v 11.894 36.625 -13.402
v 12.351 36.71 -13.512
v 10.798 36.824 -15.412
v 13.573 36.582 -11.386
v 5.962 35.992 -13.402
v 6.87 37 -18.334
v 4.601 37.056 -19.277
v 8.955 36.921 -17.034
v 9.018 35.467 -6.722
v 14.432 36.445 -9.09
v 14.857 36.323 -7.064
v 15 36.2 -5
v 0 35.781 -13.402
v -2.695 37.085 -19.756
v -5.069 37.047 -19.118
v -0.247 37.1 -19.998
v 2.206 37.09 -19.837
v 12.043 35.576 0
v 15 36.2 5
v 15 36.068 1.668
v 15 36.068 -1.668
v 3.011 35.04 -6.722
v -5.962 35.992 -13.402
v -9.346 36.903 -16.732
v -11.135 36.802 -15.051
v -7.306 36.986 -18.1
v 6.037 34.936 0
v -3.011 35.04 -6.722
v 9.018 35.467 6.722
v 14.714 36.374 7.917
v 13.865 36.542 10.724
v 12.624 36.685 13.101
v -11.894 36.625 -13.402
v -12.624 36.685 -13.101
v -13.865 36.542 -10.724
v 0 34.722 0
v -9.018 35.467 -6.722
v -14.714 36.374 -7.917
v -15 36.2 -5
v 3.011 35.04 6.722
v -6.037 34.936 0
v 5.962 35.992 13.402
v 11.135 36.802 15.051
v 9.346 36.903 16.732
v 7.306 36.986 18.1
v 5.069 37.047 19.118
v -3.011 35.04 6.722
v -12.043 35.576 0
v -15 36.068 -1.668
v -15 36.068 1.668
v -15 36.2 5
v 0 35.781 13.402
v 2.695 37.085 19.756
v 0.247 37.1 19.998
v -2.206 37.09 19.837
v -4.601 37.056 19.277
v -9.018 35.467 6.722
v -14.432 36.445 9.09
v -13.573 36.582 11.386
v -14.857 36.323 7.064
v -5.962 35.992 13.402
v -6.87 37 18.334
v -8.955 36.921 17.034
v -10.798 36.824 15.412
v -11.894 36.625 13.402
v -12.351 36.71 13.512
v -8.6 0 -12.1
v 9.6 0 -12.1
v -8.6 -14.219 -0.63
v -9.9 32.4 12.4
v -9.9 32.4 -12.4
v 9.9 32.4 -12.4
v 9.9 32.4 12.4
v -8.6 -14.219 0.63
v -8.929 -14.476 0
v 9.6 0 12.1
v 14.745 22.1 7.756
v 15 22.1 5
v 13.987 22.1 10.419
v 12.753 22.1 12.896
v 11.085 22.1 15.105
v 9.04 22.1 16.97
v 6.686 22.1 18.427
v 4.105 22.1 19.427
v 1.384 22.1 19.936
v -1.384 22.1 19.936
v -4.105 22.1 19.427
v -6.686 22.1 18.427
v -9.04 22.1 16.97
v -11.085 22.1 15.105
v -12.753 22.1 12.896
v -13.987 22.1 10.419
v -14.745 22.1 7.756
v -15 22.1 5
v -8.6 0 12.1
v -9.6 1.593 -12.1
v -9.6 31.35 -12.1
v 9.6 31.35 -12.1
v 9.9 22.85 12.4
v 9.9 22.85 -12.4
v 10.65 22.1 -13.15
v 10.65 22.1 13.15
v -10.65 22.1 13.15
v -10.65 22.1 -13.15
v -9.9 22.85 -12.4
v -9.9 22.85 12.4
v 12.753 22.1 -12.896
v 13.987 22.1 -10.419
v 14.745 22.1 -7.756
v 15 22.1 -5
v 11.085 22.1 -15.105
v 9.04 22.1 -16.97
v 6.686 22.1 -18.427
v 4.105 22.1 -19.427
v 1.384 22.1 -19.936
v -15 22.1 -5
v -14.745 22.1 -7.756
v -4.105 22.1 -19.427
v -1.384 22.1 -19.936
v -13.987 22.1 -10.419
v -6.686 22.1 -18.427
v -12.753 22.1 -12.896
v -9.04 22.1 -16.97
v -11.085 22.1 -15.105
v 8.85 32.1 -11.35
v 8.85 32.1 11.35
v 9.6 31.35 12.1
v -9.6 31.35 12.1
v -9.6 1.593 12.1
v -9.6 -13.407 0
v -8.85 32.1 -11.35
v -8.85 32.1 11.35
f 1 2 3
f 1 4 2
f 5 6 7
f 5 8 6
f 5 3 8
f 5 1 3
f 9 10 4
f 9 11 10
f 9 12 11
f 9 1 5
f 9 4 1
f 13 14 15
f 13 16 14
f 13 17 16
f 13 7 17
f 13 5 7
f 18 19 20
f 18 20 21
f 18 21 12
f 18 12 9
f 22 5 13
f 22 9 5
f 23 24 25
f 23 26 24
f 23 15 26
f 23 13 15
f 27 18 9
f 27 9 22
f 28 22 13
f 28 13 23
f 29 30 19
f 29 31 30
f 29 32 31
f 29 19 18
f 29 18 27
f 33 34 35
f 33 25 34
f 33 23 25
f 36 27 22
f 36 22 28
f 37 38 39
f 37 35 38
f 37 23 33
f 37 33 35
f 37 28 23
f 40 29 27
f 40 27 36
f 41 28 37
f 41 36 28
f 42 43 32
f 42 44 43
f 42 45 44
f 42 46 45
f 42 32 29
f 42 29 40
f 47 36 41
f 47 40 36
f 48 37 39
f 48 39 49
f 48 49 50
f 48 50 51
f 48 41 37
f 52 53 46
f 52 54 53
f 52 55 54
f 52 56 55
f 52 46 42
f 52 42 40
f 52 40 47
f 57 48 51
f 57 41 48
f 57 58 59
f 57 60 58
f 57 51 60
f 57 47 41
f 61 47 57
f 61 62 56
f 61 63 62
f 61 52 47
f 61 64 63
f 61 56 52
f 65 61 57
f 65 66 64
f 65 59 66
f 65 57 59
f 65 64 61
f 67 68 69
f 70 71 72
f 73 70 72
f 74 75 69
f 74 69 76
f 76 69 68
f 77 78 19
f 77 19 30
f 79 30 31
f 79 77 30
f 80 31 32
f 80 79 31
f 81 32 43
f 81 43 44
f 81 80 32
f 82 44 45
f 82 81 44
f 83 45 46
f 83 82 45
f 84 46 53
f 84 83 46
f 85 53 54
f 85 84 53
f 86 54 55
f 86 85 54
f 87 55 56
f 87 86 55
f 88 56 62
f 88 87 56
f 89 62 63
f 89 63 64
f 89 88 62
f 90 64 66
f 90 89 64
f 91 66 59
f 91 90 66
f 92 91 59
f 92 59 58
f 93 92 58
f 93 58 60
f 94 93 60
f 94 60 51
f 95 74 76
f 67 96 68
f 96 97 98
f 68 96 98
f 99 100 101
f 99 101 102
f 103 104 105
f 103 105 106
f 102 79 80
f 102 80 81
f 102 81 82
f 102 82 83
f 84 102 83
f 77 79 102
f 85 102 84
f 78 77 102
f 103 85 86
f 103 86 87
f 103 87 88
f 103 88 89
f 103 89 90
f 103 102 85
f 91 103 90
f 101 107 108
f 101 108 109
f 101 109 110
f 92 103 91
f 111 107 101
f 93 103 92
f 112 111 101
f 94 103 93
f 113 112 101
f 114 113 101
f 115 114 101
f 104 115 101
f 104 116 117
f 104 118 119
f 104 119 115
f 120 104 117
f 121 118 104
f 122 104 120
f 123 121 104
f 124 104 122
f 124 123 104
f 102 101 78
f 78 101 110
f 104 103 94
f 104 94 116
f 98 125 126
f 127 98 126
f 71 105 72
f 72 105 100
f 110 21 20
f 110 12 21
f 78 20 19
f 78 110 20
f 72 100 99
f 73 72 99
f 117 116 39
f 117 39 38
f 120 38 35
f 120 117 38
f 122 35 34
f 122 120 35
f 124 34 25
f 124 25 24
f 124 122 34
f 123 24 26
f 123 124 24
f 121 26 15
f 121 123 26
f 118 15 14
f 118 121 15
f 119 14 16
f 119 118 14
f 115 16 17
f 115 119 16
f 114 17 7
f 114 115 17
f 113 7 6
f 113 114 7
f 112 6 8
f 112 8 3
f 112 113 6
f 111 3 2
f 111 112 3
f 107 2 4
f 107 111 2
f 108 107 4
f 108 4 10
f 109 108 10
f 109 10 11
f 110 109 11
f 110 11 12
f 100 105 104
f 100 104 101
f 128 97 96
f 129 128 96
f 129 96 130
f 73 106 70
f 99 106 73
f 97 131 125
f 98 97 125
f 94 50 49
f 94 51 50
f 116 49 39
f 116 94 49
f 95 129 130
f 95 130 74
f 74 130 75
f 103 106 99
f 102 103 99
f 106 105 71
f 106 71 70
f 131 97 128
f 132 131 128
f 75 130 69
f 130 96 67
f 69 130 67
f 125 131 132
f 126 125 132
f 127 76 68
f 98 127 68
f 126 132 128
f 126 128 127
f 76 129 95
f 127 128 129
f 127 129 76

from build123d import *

# Parameters (mm, degrees)
SKETCH1_W               = 19.2
SKETCH1_H               = 24.2
BOSS_EXTRUDE1_DEPTH     = 22.1
BOSS_EXTRUDE2_DEPTH     = 15
BOSS_EXTRUDE3_DEPTH     = 5
BOSS_EXTRUDE4_DEPTH     = 1.5
FILLET1_R               = 3
SKETCH9_W               = 19.8
SKETCH9_H               = 24.8
SKETCH9_W_2             = 19.2
SKETCH9_H_2             = 24.2
CUT_EXTRUDE_THIN1_DEPTH = 10
SKETCH10_W              = 24.8
SKETCH10_H              = 0.3
CUT_EXTRUDE1_DEPTH      = 19.2
SKETCH12_W              = 19.8
SKETCH12_H              = 24.8
CUT_EXTRUDE3_DEPTH      = 0.3
SKETCH13_W              = 24.2
SKETCH13_H              = 15
CUT_EXTRUDE4_DEPTH      = 49.801332116
CHAMFER1_SIZE           = 0.75
CHAMFER2_SIZE           = 0.75
BOSS_EXTRUDE5_DEPTH     = 24.2
CUT_EXTRUDE5_DEPTH      = 19.2
CHAMFER3_SIZE           = 1


with BuildPart() as part:
    # Sketch1 → Boss-Extrude1 (new body)
    with BuildSketch(Plane(origin=(0, 0, 0), x_dir=(1, 0, 0), z_dir=(0, 1, 0))):
        Rectangle(SKETCH1_W, SKETCH1_H)
    extrude(amount=BOSS_EXTRUDE1_DEPTH)

    # Sketch2 → Boss-Extrude2 (add)
    with BuildSketch(Plane(origin=(0, 22.1, 0), x_dir=(1, 0, 0), z_dir=(0, 1, 0))):
        with BuildLine():
            Line((15, 5), (15, -5))
            ThreePointArc((15, -5), (0, -20), (-15, -5))
            Line((-15, -5), (-15, 5))
            ThreePointArc((-15, 5), (0, 20), (15, 5))
        make_face()
    extrude(amount=BOSS_EXTRUDE2_DEPTH)

    # Sketch4 → Boss-Extrude3 (add)
    with BuildSketch(Plane.ZY.offset(9.6)):
        Polygon((-12.1, 0), (0, -15), (12.1, 0), align=None)
    extrude(amount=-BOSS_EXTRUDE3_DEPTH)

    # Sketch6 → Boss-Extrude4 (add, symmetric)
    with BuildSketch(Plane.XY):
        Polygon((-4.6, -5), (9.6, 0), (-4.6, 0), align=None)
    extrude(amount=BOSS_EXTRUDE4_DEPTH, both=True)

    # Fillet1
    fillet1_edges = [part.edges().sort_by_distance(p)[0] for p in [
        (-4.6, 0, 6.8),
        (-4.6, 0, -6.8),
    ]]
    fillet(fillet1_edges, radius=FILLET1_R)

    # Sketch8 → Cut-Revolve3 (revolve, cut)
    with BuildSketch(Plane(origin=(0, 0, 0), x_dir=(0, 0, -1), z_dir=(1, 0, 0))):
        with BuildLine():
            Line((-85.278426346, 120), (85.278426346, 120))
            ThreePointArc((85.278426346, 120), (0, 34.721573654), (-85.278426346, 120))
        make_face()
    revolve(axis=Axis((0, 120, 85.278426346), (0, 0, -1)), mode=Mode.SUBTRACT)

    # Sketch9 → Cut-Extrude-Thin1 (cut)
    with BuildSketch(Plane.XZ.offset(-22.1)):
        Rectangle(SKETCH9_W, SKETCH9_H)
        Rectangle(SKETCH9_W_2, SKETCH9_H_2, mode=Mode.SUBTRACT)
    extrude(amount=-CUT_EXTRUDE_THIN1_DEPTH, mode=Mode.SUBTRACT)

    # Sketch10 → Cut-Extrude1 (cut)
    with BuildSketch(Plane.ZY.offset(9.6)):
        with Locations((0, 32.25)):
            Rectangle(SKETCH10_W, SKETCH10_H)
    extrude(amount=-CUT_EXTRUDE1_DEPTH, mode=Mode.SUBTRACT)


with BuildPart() as cut_extrude1_piece_1:
    # of the separate pieces the step leaves, piece 1, a body of its own (cut_extrude1_pieces)
    add(part.part.solids().sort_by_distance((-1.6, 0, -12.1))[0])

    # Sketch13 → Cut-Extrude4 (cut, through all)
    with BuildSketch(Plane(origin=(9.6, 0, 0), x_dir=(0, 0, -1), z_dir=(1, 0, 0))):
        with Locations((0, -7.5)):
            Rectangle(SKETCH13_W, SKETCH13_H)
    extrude(amount=-CUT_EXTRUDE4_DEPTH, mode=Mode.SUBTRACT)

    # Chamfer2
    chamfer2_edges = [cut_extrude1_piece_1.edges().sort_by_distance(p)[0] for p in [
        (0, 32.1, -12.1),
        (9.6, 32.1, 0),
        (0, 32.1, 12.1),
        (-9.6, 32.1, 0),
    ]]
    chamfer(chamfer2_edges, length=CHAMFER2_SIZE)

    # Sketch19 → Boss-Extrude5 (add)
    with BuildSketch(Plane(origin=(0, 0, -12.1), x_dir=(-1, 0, 0), z_dir=(0, 0, -1))):
        Polygon((-9.6, 0), (9.6, 0), (9.6, -15), align=None)
    extrude(amount=-BOSS_EXTRUDE5_DEPTH)

    # Sketch20 → Cut-Extrude5 (cut)
    with BuildSketch(Plane(origin=(9.6, 0, 0), x_dir=(0, 0, -1), z_dir=(1, 0, 0))):
        Polygon((0, -15), (-12.1, 0), (-12.1, -15), align=None)
        Polygon((12.1, 0), (0, -15), (12.1, -15), align=None)
    extrude(amount=-CUT_EXTRUDE5_DEPTH, mode=Mode.SUBTRACT)

    # Chamfer3
    # the kernel refuses this chamfer: 1 mm, written as the material it takes off along each edge
    with BuildSketch(Plane(origin=(-9.6, -17.001621212, -1.614641111), x_dir=(-0.02749587661058568, 0.6276164868252807, -0.778036967138778), z_dir=(0, 0.7783312410184164, 0.6278538677548557)), Plane(origin=(-9.6, 2.001621212, -13.714641111), x_dir=(-0.0274958766105857, 0.6276164868252808, 0.7780369671387779), z_dir=(0, -0.7783312410184163, 0.6278538677548559))) as chamfer3_piece_1:
        Polygon((CHAMFER3_SIZE * 0.999621916911, -CHAMFER3_SIZE * 0.0274958766106), (-CHAMFER3_SIZE * 0.0274958766106, -CHAMFER3_SIZE * 0.999621916911), (0, 0), align=None)
    extrude(amount=24.415366391, mode=Mode.SUBTRACT)


with BuildPart() as cut_extrude1_piece_2:
    # of the separate pieces the step leaves, piece 2, a body of its own (cut_extrude1_pieces)
    add(part.part.solids().sort_by_distance((-9.6, 32.1, -12.4))[0])

    # Sketch12 → Cut-Extrude3 (cut)
    with BuildSketch(Plane.XZ.offset(-32.1)):
        Rectangle(SKETCH12_W, SKETCH12_H)
    extrude(amount=-CUT_EXTRUDE3_DEPTH, mode=Mode.SUBTRACT)

    # Chamfer1
    chamfer1_edges = [cut_extrude1_piece_2.edges().sort_by_distance(p)[0] for p in [
        (9.9, 22.1, 0),
        (0, 22.1, -12.4),
        (-9.9, 22.1, 0),
        (0, 22.1, 12.4),
    ]]
    chamfer(chamfer1_edges, length=CHAMFER1_SIZE)


solid = Compound([cut_extrude1_piece_1.part, cut_extrude1_piece_2.part])
